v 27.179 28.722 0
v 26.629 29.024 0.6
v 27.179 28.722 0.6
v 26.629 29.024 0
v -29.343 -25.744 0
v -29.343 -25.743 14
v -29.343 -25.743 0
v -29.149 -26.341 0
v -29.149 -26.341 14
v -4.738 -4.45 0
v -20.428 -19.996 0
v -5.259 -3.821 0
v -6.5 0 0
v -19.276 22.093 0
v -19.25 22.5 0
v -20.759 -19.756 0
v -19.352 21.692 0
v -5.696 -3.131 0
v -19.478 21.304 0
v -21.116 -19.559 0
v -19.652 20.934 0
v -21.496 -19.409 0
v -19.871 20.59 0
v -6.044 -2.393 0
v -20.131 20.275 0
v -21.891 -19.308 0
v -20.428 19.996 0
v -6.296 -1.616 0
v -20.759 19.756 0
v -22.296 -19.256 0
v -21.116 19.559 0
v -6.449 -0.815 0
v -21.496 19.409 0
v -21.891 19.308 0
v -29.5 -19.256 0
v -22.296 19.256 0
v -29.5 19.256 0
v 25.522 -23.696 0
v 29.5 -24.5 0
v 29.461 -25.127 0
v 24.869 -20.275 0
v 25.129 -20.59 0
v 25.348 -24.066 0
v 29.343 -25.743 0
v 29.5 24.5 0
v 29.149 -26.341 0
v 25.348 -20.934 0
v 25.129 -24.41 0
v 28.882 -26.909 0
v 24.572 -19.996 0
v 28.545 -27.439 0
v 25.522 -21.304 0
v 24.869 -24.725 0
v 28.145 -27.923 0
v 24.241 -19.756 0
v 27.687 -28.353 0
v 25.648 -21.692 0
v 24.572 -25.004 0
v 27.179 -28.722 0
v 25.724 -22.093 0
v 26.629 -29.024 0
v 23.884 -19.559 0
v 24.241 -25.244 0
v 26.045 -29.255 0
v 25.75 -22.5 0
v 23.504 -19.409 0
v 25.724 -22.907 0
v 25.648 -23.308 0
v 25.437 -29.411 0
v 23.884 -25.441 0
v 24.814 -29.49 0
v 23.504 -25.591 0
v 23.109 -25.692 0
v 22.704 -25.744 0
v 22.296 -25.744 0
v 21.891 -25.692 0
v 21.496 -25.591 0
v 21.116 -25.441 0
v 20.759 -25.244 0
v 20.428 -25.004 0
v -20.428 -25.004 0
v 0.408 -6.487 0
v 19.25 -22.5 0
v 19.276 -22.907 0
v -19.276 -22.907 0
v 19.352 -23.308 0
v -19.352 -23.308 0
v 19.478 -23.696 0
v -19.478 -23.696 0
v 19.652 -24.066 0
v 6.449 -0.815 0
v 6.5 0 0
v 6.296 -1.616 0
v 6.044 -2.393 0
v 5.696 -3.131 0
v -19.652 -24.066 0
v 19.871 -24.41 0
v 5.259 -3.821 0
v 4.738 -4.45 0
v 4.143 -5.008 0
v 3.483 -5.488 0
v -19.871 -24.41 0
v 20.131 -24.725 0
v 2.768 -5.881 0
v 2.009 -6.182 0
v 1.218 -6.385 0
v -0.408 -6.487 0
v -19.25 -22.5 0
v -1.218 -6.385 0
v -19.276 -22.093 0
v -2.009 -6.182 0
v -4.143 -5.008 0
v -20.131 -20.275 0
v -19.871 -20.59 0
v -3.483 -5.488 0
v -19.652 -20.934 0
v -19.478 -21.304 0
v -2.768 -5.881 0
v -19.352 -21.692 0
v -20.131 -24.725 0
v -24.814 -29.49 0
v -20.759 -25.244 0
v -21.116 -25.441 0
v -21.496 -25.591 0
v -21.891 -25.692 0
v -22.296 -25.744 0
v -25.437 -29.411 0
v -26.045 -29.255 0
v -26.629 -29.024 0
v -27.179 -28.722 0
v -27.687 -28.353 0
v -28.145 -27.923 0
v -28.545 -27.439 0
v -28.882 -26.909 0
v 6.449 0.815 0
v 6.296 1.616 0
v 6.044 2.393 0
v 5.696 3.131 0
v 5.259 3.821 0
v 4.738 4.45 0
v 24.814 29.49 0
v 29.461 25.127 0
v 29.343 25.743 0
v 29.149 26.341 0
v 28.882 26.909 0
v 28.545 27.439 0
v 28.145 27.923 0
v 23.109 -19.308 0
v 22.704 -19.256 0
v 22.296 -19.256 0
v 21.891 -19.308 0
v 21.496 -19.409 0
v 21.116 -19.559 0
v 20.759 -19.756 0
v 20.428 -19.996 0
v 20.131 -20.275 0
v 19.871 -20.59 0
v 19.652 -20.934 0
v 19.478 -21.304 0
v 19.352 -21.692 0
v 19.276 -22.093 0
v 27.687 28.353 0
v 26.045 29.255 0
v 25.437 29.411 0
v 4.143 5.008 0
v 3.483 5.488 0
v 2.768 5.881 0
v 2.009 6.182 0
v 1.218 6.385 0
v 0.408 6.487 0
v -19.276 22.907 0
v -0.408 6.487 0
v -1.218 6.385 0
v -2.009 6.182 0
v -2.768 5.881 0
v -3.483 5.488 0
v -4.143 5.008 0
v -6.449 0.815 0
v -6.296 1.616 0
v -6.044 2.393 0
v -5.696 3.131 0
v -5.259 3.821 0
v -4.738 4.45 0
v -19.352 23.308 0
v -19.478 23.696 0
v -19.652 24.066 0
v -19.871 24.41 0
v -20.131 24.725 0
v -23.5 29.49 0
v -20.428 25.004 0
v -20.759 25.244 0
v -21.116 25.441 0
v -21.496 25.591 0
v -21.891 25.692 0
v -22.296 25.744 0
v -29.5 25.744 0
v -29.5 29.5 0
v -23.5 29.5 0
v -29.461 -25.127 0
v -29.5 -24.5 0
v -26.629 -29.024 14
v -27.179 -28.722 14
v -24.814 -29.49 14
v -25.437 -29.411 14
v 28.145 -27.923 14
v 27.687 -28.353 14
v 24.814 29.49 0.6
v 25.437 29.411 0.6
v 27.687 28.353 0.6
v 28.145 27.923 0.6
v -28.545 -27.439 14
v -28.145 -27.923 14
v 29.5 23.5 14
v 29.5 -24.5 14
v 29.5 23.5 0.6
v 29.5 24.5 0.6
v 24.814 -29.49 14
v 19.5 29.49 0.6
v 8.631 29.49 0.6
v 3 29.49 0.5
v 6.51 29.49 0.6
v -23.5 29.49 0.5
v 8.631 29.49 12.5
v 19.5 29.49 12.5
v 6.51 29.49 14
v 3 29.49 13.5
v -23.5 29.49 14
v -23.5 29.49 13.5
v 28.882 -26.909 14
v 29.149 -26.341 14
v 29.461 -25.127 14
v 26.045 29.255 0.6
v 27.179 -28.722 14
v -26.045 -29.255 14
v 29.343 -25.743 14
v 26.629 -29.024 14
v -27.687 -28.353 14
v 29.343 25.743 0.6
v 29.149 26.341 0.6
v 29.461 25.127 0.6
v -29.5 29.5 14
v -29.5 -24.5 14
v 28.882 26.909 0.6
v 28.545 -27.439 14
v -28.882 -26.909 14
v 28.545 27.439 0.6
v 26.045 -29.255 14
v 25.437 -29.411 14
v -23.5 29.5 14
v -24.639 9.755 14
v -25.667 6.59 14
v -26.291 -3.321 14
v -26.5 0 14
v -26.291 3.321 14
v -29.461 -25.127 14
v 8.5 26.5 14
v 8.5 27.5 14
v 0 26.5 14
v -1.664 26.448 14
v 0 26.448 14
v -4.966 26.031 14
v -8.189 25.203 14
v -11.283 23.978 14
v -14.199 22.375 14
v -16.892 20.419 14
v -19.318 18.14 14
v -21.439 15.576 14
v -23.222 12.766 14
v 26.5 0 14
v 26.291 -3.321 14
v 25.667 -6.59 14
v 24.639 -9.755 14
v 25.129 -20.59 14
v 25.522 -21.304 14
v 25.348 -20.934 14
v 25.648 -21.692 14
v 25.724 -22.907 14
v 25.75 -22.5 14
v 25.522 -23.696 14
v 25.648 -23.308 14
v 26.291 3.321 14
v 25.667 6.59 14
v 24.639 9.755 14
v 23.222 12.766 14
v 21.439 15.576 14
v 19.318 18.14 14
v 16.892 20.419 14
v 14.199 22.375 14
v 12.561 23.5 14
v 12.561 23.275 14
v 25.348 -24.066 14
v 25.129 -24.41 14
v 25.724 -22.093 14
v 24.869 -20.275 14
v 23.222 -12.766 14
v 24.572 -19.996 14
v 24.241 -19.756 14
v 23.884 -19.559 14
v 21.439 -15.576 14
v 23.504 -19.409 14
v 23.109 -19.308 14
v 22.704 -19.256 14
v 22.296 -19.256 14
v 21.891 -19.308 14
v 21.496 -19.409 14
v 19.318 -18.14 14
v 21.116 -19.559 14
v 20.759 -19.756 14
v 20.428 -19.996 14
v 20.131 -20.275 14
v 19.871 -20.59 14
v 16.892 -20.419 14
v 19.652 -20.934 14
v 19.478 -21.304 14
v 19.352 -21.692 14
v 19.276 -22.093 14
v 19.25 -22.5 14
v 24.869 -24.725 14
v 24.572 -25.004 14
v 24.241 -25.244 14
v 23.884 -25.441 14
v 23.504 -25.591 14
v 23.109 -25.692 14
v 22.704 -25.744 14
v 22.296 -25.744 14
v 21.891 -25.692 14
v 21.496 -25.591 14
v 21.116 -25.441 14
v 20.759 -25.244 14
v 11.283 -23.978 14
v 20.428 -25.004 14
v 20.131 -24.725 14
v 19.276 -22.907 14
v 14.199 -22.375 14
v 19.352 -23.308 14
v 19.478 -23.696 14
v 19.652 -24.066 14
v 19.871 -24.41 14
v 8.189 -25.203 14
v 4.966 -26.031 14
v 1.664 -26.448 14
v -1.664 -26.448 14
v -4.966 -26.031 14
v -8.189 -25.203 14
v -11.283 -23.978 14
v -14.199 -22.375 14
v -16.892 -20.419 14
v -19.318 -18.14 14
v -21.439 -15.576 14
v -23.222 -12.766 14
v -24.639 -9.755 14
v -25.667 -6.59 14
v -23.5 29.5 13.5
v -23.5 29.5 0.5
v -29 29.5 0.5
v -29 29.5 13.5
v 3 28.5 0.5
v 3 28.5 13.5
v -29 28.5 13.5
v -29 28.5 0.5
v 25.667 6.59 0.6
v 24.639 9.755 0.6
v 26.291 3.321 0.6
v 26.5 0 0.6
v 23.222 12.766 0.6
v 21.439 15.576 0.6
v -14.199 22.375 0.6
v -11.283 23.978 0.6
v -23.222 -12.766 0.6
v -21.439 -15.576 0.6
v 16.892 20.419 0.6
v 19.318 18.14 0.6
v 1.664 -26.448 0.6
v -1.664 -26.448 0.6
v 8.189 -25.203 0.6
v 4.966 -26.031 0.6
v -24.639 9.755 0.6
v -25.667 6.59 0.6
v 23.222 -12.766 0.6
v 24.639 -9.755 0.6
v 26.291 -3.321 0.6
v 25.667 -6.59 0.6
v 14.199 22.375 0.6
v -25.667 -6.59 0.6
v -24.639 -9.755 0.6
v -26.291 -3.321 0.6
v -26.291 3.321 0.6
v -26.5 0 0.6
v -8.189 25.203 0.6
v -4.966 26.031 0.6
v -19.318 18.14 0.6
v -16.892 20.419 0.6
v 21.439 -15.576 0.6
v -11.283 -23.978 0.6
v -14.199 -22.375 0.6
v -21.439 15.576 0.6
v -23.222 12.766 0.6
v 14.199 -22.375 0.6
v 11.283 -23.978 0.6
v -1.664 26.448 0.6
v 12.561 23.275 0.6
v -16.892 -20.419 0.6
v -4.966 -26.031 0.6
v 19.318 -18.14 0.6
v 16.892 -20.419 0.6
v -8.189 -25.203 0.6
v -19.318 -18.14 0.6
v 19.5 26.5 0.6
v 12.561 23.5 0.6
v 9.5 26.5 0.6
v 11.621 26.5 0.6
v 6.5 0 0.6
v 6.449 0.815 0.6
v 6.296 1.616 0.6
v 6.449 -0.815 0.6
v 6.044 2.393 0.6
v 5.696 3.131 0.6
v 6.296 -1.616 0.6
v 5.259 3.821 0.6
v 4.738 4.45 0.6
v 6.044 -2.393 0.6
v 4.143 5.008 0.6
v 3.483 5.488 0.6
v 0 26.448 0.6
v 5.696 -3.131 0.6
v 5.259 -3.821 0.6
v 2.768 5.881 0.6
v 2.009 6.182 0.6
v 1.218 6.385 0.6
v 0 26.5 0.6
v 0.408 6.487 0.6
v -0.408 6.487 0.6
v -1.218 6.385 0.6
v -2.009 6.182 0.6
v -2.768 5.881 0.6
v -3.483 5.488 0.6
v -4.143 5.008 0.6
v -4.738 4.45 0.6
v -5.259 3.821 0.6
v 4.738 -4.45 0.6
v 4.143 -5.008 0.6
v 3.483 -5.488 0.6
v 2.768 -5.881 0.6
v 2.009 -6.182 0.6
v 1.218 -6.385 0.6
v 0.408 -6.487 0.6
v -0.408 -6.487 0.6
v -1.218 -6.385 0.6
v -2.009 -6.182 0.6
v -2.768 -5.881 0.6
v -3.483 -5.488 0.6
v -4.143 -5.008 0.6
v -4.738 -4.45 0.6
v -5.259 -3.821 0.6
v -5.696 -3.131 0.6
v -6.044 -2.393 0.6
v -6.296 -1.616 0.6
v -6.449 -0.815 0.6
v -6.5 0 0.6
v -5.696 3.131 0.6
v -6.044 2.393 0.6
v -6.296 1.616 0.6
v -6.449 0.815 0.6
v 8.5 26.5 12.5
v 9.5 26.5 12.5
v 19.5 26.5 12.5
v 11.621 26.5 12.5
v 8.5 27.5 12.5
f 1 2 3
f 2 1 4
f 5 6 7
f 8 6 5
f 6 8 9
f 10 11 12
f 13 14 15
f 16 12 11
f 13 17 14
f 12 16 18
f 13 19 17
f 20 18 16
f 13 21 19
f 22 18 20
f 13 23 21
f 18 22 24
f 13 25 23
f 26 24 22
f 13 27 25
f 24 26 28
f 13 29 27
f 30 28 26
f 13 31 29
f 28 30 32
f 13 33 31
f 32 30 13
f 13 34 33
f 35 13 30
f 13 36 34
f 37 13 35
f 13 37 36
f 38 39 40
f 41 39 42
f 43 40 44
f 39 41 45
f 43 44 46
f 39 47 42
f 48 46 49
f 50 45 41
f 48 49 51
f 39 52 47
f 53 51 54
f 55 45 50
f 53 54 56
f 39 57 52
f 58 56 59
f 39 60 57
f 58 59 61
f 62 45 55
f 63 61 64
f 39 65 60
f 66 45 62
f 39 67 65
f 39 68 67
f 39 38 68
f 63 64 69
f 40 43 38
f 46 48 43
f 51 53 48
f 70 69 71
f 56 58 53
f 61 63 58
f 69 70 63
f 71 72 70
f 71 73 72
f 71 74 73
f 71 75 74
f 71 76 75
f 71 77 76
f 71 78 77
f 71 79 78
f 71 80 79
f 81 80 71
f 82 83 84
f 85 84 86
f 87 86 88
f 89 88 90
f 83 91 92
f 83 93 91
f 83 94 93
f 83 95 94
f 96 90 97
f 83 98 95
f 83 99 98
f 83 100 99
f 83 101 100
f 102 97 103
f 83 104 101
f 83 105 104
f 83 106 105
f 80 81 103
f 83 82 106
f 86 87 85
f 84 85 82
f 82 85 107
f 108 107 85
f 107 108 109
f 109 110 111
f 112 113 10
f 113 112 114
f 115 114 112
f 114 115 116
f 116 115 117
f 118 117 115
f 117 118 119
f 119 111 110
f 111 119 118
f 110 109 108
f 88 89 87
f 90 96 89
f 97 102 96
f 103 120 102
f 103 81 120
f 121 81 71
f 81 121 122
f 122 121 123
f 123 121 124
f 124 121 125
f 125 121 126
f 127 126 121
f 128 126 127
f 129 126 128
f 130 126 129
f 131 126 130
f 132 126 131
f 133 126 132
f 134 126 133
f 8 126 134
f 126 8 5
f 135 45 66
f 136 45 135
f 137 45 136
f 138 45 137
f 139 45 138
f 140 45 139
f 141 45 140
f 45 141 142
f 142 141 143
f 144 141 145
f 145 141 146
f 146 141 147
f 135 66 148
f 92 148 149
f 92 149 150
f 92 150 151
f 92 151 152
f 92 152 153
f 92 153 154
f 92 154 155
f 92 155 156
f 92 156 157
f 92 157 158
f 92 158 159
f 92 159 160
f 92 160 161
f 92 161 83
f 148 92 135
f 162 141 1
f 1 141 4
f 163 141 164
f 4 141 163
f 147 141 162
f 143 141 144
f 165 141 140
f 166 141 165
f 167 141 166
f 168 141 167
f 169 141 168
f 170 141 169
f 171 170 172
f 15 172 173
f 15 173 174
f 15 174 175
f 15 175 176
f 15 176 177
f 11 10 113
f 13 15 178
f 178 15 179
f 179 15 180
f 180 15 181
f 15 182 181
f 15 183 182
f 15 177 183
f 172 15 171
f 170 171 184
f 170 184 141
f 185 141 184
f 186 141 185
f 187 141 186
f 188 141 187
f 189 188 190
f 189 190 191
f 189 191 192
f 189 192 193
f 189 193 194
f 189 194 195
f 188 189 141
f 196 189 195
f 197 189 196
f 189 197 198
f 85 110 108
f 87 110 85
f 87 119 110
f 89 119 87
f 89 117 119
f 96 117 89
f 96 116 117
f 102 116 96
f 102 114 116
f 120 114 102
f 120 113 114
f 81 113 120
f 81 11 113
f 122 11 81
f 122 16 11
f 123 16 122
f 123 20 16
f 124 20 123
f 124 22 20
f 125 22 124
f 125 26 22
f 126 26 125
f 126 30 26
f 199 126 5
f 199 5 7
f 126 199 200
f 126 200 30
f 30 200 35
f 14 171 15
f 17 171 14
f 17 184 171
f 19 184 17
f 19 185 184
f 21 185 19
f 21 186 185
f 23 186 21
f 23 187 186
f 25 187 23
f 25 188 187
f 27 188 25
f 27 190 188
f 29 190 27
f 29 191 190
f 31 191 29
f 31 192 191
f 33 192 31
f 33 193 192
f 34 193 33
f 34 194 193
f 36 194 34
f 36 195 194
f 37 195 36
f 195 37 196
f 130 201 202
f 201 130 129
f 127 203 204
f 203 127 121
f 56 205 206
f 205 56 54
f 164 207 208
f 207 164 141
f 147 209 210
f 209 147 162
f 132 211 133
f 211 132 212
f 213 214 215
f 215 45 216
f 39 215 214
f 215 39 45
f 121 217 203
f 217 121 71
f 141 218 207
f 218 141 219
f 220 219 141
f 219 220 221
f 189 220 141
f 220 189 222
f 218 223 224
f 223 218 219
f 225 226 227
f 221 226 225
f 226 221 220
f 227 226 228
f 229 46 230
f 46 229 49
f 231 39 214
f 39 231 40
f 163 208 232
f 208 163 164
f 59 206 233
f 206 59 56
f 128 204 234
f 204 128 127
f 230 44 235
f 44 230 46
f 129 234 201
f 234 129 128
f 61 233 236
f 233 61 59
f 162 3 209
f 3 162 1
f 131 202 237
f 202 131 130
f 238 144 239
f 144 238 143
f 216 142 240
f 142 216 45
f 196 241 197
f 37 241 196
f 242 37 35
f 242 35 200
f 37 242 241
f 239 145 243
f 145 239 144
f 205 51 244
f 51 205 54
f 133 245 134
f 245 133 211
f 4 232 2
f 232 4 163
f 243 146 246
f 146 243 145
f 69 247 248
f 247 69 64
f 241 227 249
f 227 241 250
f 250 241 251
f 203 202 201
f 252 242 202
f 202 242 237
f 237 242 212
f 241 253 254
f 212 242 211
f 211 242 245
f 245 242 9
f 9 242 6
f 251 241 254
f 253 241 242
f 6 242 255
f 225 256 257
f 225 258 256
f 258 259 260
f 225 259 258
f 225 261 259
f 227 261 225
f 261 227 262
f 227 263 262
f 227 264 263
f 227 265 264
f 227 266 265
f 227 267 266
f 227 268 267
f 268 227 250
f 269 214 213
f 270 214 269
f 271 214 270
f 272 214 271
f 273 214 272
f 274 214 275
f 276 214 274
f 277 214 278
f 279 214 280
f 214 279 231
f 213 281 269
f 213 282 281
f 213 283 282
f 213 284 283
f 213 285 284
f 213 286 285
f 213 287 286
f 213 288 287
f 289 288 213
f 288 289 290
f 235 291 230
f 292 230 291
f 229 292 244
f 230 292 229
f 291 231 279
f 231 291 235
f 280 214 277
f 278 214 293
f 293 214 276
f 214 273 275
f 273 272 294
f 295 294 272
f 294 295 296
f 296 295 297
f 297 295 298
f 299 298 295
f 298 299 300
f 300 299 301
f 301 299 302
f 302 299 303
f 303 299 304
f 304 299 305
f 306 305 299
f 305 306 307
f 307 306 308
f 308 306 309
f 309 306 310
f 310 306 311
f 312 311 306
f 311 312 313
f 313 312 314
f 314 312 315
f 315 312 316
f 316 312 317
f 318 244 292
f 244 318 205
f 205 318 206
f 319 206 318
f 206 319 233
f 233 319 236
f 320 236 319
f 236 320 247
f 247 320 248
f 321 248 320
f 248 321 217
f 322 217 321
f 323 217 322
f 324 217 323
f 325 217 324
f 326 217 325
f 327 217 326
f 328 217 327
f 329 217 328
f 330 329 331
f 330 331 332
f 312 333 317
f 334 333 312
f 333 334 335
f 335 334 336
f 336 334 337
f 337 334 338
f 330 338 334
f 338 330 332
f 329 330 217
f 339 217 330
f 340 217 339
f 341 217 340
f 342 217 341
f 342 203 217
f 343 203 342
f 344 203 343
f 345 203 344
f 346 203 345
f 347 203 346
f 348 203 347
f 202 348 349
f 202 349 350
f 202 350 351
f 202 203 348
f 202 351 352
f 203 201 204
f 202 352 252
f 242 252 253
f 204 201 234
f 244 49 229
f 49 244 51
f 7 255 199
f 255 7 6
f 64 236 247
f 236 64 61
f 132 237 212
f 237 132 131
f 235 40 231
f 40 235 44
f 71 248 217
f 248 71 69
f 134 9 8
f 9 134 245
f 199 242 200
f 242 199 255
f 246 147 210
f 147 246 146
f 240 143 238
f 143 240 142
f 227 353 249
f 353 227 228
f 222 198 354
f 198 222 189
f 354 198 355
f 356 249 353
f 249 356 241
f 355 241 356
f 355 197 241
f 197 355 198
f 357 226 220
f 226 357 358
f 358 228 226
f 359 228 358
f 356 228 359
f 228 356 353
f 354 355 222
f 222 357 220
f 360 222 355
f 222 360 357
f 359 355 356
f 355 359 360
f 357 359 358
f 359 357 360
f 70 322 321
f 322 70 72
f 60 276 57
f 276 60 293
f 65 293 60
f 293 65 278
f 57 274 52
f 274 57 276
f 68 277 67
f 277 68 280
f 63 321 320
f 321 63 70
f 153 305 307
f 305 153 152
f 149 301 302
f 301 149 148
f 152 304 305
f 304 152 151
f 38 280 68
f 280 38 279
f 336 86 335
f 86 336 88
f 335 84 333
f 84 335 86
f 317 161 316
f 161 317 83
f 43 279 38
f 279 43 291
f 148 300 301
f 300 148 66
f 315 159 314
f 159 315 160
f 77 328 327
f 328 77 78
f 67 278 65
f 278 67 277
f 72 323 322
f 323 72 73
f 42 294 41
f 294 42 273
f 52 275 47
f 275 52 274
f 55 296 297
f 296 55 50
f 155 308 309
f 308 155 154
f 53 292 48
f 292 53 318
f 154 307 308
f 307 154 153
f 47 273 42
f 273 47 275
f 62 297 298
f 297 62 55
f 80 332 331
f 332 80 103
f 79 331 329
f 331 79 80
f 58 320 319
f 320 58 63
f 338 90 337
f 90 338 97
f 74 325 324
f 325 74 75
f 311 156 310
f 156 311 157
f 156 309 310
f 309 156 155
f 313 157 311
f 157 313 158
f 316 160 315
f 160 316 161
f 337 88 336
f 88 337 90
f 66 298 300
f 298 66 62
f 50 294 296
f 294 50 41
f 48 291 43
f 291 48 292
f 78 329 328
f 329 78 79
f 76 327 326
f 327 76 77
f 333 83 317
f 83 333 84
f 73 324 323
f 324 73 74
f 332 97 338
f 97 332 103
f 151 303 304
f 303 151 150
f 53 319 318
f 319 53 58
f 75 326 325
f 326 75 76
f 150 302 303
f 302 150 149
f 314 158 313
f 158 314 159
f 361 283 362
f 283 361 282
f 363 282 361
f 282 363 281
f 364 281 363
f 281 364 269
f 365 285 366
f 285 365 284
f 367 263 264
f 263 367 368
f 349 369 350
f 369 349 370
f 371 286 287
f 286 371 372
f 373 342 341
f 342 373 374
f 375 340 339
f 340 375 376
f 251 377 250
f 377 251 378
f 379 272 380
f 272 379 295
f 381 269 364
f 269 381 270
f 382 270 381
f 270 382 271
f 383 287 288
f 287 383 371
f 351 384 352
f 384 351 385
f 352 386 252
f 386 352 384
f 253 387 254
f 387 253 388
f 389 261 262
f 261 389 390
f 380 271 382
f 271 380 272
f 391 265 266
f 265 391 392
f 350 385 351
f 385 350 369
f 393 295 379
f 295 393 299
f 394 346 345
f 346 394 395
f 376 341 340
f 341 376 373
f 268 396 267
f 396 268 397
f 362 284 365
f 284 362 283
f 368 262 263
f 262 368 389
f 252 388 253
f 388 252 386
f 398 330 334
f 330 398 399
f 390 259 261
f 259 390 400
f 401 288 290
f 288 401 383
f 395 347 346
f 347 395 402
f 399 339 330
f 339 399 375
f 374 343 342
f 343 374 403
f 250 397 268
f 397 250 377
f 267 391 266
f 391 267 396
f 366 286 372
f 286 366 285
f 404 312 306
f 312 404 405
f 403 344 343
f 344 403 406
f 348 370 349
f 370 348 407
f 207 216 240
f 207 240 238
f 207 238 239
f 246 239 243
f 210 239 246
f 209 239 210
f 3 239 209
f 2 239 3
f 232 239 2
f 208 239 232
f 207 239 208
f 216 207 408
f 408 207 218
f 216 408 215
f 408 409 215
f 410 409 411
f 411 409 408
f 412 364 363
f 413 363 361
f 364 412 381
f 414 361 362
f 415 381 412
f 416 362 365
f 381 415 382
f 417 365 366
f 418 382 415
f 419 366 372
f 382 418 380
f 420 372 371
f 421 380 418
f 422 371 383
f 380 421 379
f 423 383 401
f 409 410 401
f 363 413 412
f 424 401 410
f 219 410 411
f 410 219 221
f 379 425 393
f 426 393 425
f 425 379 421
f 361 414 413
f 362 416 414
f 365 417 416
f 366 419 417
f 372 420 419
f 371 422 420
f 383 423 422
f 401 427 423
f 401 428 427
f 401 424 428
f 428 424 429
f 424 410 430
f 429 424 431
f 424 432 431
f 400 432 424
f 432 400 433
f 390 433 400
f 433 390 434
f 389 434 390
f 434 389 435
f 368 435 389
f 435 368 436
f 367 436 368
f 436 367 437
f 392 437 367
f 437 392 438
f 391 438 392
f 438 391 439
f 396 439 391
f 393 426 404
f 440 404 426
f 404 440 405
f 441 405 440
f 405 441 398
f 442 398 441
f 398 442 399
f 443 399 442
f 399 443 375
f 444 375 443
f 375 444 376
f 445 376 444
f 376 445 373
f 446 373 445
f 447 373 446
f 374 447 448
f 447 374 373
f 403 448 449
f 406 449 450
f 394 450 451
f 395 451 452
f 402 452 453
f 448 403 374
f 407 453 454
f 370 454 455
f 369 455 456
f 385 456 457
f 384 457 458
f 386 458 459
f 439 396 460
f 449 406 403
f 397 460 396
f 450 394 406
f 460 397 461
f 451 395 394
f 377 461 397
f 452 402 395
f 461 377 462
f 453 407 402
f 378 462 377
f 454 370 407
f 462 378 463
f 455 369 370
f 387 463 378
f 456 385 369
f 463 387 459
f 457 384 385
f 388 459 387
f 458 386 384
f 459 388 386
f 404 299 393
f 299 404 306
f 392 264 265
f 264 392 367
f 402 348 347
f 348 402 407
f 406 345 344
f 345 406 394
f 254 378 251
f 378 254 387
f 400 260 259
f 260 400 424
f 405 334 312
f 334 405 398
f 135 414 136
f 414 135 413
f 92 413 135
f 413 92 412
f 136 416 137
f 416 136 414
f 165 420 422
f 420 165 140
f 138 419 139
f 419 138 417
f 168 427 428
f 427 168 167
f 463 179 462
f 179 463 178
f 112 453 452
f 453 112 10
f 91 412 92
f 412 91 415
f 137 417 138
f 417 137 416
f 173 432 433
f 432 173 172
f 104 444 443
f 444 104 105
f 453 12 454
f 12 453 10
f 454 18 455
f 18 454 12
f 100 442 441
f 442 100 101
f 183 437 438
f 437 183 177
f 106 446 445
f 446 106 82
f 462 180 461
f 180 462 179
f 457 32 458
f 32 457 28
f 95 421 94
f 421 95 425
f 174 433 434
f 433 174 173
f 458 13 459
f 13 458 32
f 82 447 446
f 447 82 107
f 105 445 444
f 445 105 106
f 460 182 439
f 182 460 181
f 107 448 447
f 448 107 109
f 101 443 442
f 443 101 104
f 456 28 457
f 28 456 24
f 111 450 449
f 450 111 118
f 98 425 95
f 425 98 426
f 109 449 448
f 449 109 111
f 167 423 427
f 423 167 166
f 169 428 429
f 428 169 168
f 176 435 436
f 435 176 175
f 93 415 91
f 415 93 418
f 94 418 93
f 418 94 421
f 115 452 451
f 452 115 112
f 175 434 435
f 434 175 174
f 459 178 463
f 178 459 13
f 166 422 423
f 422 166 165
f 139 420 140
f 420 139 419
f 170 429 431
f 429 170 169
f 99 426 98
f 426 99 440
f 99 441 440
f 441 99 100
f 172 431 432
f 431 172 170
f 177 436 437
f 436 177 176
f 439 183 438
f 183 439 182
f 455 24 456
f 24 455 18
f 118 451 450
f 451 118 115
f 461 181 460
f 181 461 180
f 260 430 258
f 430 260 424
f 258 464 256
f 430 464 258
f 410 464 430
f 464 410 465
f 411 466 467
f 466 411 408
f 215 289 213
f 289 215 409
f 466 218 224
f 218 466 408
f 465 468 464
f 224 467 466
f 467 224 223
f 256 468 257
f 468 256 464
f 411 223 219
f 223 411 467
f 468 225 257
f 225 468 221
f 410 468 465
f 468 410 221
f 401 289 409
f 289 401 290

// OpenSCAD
$fn = 50;


difference() {
	union() {
		hull() {
			translate(v = [-24.5000000000, 24.5000000000, 0]) {
				cylinder(h = 14, r = 5);
			}
			translate(v = [24.5000000000, 24.5000000000, 0]) {
				cylinder(h = 14, r = 5);
			}
			translate(v = [-24.5000000000, -24.5000000000, 0]) {
				cylinder(h = 14, r = 5);
			}
			translate(v = [24.5000000000, -24.5000000000, 0]) {
				cylinder(h = 14, r = 5);
			}
		}
		translate(v = [-29.5000000000, 23.5000000000, 0]) {
			cube(size = [6, 6, 14]);
		}
	}
	union() {
		translate(v = [-30.0000000000, -22.5000000000, -250.0000000000]) {
			rotate(a = [0, 0, 0]) {
				difference() {
					union() {
						hull() {
							translate(v = [7.5000000000, 0, 0]) {
								cylinder(h = 250, r = 3.2500000000, r1 = 3.2500000000, r2 = 3.2500000000);
							}
							translate(v = [-7.5000000000, 0, 0]) {
								cylinder(h = 250, r = 3.2500000000, r1 = 3.2500000000, r2 = 3.2500000000);
							}
						}
					}
					union();
				}
			}
		}
		translate(v = [-30.0000000000, 22.5000000000, -250.0000000000]) {
			rotate(a = [0, 0, 0]) {
				difference() {
					union() {
						hull() {
							translate(v = [7.5000000000, 0, 0]) {
								cylinder(h = 250, r = 3.2500000000, r1 = 3.2500000000, r2 = 3.2500000000);
							}
							translate(v = [-7.5000000000, 0, 0]) {
								cylinder(h = 250, r = 3.2500000000, r1 = 3.2500000000, r2 = 3.2500000000);
							}
						}
					}
					union();
				}
			}
		}
		translate(v = [-29.0000000000, 28.5000000000, 0.5000000000]) {
			cube(size = [32, 1, 13.0000000000]);
		}
		translate(v = [22.5000000000, -22.5000000000, -50.0000000000]) {
			cylinder(h = 100, r = 3.2500000000);
		}
		translate(v = [0, 0, 0.6000000000]) {
			cylinder(h = 16.4000000000, r = 26.5000000000);
		}
		translate(v = [0, 0, -7.0000000000]) {
			cylinder(h = 14, r = 6.5000000000);
		}
		translate(v = [0.0000000000, 23.5000000000, 0.6000000000]) {
			cube(size = [29.5000000000, 3, 16.4000000000]);
		}
		translate(v = [19.5000000000, 23.5000000000, 0.6000000000]) {
			cube(size = [10, 6, 16.4000000000]);
		}
		translate(v = [8.5000000000, 23.5000000000, 12.5000000000]) {
			cube(size = [21, 6, 1.5000000000]);
		}
		translate(v = [5.7500000000, 30.2500000000, 0.6000000000]) {
			rotate(a = [0, 0, -45]) {
				cube(size = [7.5000000000, 1.5000000000, 16.4000000000]);
			}
		}
		translate(v = [5.0610000000, 21.5000000000, 0.6000000000]) {
			cube(size = [7.5000000000, 2, 13.4000000000]);
		}
	}
}
